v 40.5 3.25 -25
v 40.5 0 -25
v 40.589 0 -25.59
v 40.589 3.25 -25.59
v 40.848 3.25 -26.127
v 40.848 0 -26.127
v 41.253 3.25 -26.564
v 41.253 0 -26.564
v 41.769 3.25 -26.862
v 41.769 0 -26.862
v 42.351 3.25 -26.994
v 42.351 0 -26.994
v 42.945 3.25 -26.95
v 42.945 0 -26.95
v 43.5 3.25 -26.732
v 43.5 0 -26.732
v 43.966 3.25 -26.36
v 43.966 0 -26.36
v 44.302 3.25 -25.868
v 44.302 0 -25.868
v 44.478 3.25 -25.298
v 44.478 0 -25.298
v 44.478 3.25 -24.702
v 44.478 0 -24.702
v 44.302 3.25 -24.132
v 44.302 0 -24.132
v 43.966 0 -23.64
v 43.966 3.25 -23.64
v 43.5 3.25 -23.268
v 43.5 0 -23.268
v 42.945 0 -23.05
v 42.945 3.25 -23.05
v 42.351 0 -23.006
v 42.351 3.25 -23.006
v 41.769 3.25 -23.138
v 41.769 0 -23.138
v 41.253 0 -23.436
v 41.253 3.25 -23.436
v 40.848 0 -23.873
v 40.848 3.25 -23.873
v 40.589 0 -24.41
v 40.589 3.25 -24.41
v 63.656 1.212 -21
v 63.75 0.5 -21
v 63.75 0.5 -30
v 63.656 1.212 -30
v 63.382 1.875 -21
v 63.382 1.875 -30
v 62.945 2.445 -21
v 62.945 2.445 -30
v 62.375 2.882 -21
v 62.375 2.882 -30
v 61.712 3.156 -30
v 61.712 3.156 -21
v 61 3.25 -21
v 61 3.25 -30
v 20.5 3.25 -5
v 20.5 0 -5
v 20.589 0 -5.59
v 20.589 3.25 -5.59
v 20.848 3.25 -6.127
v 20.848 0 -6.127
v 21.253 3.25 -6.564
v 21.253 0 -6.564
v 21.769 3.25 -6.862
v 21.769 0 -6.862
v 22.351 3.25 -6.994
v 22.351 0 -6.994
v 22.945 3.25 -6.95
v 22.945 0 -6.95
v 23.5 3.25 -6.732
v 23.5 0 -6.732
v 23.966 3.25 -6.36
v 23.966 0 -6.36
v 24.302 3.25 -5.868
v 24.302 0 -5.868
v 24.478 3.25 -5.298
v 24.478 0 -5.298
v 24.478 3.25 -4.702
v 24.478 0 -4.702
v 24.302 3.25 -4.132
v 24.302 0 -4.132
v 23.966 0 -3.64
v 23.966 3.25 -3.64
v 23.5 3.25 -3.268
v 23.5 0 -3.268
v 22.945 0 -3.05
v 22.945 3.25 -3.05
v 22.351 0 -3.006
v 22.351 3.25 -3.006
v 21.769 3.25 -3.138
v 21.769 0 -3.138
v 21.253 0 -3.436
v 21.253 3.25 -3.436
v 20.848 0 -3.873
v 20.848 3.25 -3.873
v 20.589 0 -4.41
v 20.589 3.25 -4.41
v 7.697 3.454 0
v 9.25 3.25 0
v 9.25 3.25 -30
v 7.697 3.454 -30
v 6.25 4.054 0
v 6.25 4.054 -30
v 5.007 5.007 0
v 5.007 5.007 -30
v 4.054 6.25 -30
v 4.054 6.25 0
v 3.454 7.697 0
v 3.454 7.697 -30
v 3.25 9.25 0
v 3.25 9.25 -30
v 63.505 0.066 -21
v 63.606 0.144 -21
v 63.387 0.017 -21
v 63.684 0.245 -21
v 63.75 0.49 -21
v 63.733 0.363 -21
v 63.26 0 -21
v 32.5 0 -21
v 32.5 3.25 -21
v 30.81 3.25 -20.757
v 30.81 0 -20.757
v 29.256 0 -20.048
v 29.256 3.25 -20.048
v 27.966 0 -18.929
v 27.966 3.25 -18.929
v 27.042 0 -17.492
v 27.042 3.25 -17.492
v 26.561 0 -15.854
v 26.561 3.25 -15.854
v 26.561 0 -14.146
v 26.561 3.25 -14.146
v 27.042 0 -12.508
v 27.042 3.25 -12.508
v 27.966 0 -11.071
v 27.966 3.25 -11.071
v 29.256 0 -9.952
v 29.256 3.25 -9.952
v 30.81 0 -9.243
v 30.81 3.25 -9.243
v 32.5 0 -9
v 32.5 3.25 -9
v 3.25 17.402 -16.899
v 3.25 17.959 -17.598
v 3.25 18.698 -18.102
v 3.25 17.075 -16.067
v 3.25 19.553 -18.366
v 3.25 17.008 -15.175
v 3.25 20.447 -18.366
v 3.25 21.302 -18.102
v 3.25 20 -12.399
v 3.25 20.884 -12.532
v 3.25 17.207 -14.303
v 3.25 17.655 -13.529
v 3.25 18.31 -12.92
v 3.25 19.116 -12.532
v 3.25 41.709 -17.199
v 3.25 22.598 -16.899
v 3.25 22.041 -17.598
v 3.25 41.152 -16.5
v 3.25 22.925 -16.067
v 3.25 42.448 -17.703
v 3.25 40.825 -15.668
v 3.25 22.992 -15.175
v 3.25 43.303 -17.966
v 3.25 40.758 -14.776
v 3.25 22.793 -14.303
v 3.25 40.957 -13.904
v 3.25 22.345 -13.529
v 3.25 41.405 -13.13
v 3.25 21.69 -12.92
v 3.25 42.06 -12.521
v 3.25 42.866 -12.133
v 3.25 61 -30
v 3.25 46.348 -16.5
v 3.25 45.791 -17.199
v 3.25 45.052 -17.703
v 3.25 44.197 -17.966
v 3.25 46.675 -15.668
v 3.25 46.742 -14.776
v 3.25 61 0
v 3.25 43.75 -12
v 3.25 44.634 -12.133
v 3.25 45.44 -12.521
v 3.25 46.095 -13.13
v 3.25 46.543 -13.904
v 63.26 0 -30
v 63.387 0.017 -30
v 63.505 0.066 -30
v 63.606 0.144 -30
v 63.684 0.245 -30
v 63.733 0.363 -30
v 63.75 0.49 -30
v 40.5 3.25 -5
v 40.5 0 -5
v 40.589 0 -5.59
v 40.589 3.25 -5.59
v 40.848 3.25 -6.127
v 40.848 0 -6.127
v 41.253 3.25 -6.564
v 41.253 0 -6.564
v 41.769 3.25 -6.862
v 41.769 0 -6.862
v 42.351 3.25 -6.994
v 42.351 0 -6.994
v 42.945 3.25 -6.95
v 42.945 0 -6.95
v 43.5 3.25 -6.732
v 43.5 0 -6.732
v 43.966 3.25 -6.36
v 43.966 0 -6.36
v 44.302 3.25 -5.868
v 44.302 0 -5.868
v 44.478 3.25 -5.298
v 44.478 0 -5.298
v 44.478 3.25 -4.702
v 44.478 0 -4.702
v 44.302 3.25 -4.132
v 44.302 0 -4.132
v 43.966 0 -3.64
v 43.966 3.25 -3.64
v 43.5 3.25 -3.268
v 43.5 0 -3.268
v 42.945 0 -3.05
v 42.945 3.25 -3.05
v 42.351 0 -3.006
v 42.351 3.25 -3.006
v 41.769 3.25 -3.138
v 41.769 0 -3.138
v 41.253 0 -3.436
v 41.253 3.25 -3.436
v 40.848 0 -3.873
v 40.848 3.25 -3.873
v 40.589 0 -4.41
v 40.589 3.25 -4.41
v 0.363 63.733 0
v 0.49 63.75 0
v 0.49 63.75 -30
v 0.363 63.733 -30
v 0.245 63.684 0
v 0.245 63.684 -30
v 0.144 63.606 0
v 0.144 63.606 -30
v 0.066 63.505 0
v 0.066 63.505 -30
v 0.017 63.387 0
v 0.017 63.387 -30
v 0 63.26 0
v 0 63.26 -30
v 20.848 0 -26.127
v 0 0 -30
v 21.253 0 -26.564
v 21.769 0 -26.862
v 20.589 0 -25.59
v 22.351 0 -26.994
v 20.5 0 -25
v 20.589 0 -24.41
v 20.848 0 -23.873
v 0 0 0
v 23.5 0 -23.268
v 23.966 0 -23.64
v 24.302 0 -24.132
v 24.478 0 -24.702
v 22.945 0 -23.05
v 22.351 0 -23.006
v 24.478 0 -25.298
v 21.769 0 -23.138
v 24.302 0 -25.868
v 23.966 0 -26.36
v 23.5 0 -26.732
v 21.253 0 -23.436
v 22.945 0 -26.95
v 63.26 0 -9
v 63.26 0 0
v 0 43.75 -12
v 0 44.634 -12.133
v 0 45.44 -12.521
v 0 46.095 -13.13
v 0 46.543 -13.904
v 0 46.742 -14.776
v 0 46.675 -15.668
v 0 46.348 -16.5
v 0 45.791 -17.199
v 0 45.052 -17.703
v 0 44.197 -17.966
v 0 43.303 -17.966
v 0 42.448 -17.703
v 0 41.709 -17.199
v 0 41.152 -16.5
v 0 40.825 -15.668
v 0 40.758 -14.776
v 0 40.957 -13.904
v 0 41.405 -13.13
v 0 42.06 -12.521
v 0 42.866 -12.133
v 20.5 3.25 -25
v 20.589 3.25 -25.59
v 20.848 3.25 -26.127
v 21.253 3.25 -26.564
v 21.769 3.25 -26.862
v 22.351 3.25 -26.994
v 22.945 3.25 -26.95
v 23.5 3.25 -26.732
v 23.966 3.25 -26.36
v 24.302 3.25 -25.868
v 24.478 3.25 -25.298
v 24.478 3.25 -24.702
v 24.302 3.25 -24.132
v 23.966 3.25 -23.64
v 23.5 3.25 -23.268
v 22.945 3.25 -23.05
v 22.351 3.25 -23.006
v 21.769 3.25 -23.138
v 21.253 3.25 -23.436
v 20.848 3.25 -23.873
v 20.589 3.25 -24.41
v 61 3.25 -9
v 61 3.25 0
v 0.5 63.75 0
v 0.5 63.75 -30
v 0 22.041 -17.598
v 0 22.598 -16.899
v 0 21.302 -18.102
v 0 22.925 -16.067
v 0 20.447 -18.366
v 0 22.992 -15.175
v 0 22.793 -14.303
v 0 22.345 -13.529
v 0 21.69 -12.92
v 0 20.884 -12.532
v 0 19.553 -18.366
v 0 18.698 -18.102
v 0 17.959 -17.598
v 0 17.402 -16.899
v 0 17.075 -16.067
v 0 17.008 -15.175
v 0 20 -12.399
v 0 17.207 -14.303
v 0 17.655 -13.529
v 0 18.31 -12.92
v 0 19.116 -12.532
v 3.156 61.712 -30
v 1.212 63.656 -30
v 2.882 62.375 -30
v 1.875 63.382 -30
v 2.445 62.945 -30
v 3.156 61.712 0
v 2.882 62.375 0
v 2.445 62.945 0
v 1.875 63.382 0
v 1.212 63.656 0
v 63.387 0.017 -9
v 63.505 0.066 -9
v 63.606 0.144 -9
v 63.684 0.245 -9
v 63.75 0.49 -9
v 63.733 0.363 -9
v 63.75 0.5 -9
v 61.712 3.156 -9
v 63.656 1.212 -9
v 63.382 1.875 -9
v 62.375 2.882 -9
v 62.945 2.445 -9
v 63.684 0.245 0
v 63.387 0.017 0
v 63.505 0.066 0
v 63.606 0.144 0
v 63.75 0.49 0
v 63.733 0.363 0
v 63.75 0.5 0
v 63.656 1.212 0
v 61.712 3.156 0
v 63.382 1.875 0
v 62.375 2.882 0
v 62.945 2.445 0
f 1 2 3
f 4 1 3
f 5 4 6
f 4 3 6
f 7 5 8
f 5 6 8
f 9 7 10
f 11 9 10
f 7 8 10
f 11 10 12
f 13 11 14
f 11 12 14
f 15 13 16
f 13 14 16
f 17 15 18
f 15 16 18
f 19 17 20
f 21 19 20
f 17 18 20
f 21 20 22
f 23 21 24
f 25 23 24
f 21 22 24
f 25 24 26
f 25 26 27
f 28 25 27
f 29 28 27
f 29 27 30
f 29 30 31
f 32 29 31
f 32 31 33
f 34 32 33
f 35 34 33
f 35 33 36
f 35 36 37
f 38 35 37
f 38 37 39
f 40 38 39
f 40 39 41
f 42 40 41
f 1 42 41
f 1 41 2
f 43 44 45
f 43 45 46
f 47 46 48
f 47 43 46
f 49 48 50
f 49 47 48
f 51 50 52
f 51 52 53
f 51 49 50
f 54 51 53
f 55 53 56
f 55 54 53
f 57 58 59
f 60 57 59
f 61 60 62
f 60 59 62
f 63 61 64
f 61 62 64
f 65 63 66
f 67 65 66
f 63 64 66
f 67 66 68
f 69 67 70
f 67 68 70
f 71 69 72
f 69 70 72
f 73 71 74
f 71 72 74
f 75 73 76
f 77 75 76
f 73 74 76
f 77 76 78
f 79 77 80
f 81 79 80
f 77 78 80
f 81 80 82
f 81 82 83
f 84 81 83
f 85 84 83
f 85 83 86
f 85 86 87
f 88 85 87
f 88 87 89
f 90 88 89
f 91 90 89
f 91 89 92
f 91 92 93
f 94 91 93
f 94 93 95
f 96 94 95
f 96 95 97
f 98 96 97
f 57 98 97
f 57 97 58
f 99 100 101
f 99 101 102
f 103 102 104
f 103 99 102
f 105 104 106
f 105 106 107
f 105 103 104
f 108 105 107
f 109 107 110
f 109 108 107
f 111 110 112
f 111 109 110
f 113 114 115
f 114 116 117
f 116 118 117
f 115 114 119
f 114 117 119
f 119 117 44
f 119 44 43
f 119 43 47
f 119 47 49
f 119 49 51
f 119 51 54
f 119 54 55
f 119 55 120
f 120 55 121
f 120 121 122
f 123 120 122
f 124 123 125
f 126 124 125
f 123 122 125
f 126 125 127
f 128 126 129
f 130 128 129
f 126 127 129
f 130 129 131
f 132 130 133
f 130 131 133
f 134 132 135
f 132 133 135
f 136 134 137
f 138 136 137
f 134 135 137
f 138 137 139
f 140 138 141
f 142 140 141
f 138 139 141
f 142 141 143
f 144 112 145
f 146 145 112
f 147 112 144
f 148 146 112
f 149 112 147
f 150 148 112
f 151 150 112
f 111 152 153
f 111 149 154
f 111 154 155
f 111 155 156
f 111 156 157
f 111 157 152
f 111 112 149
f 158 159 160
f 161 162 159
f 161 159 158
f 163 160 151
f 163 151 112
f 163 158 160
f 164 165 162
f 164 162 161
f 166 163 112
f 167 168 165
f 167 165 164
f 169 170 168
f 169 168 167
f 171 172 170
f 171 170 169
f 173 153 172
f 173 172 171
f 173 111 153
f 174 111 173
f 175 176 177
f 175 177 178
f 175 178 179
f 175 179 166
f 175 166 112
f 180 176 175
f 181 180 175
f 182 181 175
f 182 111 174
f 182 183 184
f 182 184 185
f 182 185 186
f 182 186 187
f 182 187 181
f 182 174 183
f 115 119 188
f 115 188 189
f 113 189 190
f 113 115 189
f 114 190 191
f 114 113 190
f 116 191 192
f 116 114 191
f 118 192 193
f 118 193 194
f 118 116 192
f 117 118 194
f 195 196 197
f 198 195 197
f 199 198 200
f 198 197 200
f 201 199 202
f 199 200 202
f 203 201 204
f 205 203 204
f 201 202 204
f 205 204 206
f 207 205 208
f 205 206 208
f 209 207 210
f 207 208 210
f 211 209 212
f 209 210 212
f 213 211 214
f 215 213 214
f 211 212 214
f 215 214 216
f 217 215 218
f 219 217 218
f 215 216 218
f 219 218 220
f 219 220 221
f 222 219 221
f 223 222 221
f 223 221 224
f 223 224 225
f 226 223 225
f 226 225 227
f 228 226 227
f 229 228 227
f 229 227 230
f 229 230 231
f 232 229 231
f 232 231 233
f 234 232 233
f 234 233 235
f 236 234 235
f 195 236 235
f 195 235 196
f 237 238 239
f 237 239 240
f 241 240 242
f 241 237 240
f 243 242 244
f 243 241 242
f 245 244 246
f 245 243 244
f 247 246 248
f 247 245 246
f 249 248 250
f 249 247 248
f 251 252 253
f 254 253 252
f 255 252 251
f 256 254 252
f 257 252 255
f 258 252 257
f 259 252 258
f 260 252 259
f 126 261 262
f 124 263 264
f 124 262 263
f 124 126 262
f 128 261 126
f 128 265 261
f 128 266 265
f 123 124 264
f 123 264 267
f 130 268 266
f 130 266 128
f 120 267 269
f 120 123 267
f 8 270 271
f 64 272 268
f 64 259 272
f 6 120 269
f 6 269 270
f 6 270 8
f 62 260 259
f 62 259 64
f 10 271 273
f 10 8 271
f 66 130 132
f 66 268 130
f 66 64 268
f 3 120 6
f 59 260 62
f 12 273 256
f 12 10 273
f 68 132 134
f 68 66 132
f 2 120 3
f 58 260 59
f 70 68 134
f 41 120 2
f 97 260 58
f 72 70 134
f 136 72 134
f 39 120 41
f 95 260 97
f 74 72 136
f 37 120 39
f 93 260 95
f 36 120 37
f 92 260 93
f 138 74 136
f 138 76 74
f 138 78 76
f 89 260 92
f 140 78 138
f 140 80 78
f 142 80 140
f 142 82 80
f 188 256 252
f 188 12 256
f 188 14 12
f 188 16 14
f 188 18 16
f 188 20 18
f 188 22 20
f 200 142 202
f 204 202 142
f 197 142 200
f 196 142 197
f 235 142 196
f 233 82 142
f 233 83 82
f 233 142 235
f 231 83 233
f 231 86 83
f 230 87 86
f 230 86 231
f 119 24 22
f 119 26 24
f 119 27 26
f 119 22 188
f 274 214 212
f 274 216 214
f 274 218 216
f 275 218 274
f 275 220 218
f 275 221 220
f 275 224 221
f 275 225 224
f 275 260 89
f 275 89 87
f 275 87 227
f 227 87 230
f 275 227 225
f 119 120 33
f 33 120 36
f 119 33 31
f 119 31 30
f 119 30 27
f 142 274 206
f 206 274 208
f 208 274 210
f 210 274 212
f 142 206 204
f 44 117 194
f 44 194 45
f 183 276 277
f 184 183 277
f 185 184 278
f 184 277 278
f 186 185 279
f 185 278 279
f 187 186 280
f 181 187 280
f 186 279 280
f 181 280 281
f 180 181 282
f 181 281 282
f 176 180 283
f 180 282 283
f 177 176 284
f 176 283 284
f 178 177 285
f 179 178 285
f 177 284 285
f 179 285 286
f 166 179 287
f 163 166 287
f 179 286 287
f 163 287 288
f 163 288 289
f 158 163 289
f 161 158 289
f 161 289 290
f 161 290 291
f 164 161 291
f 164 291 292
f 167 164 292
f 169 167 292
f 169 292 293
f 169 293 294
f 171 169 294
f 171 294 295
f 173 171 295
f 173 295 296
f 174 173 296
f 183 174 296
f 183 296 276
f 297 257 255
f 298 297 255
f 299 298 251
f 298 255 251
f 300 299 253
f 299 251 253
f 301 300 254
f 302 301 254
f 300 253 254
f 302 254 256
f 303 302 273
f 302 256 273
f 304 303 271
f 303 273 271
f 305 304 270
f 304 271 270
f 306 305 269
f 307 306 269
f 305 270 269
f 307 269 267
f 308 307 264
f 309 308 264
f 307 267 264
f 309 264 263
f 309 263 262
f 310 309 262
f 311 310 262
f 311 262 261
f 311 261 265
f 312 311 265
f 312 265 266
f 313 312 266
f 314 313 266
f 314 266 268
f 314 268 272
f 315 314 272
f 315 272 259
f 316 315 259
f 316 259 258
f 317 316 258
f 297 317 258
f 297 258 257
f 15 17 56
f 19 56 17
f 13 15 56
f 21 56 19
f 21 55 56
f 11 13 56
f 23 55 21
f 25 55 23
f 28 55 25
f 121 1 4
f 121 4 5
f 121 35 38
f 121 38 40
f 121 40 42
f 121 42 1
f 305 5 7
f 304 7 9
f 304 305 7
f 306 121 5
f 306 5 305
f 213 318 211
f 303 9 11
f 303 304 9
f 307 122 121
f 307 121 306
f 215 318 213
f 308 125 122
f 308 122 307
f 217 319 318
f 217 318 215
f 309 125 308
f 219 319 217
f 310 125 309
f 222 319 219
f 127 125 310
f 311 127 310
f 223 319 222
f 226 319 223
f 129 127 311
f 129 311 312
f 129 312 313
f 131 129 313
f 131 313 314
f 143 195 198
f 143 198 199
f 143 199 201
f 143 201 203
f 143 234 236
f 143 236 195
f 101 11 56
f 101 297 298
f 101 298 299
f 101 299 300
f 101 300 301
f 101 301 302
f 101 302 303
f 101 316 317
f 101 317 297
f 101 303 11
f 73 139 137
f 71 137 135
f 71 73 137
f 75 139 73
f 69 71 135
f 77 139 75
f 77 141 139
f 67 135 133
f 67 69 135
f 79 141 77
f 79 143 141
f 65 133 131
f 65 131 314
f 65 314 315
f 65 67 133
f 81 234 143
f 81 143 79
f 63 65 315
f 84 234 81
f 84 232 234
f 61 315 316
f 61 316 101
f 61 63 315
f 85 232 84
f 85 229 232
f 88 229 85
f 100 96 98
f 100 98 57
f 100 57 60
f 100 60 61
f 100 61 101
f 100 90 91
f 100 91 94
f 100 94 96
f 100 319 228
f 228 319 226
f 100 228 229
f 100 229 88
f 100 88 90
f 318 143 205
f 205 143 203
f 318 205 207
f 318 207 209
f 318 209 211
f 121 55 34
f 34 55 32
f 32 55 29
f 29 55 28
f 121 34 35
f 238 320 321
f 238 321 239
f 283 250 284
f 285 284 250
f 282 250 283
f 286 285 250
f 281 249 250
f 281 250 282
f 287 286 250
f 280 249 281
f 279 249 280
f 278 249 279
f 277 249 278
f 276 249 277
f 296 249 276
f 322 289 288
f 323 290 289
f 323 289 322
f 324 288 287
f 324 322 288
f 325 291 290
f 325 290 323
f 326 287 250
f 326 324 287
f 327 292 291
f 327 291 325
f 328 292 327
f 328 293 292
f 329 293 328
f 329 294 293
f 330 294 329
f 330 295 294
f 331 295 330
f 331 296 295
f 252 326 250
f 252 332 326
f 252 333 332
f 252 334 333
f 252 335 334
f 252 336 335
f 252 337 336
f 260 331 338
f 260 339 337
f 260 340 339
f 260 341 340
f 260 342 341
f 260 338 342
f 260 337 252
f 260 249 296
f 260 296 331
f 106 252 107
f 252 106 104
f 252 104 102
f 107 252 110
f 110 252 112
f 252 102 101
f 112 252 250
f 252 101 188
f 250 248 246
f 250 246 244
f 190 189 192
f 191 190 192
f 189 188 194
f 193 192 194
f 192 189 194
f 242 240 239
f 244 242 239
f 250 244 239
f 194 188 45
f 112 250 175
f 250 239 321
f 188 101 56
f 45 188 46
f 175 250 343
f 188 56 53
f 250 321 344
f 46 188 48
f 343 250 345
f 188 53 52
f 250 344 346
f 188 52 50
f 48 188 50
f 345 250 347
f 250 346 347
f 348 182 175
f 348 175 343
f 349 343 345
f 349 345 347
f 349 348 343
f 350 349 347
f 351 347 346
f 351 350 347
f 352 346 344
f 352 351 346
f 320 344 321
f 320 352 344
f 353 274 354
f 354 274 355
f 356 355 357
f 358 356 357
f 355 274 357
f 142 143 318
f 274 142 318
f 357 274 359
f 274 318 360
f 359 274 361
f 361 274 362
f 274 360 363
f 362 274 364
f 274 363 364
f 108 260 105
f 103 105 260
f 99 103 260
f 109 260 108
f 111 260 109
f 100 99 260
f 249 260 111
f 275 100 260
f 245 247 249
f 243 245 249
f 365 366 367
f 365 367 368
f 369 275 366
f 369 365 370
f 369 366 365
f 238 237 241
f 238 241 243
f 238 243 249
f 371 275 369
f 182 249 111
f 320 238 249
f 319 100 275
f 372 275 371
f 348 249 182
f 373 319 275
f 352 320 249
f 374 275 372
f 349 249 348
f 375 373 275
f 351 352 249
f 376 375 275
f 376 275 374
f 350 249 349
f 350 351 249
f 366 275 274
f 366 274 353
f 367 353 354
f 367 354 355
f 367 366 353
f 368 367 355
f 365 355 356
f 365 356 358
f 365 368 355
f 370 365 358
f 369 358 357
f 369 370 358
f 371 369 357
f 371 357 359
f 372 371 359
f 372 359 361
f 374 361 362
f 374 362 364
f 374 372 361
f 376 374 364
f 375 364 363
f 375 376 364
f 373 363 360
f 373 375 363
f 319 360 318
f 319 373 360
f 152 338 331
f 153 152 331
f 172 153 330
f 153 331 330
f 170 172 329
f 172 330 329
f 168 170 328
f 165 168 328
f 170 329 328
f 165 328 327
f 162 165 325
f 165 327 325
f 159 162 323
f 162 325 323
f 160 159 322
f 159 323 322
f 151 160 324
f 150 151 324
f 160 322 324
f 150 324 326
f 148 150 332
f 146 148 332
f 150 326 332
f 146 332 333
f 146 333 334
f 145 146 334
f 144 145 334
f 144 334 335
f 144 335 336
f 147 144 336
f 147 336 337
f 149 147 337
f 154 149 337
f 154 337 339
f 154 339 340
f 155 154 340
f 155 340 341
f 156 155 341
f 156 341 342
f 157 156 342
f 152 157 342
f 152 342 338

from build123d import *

# Parameters (mm, degrees)
BOSS_EXTRUDE1_DEPTH          = 30
F_4_0_4_DIAMETER_HOLE1_D     = 4
F_4_0_4_DIAMETER_HOLE1_DEPTH = 10
F_4_0_4_DIAMETER_HOLE1_TIP   = 1.201721238
CUT_EXTRUDE1_DEPTH           = 93.867176656
F_6_0_6_DIAMETER_HOLE1_D     = 6
F_6_0_6_DIAMETER_HOLE1_DEPTH = 10
F_6_0_6_DIAMETER_HOLE1_TIP   = 1.802581857


with BuildPart() as part:
    # Sketch2 → Boss-Extrude1 (new body)
    with BuildSketch(Plane.XY):
        with BuildLine():
            Line((0, 0), (63.26, 0))
            ThreePointArc((63.26, 0), (63.606482323, 0.143517677), (63.75, 0.49))
            Line((63.75, 0.49), (63.75, 0.5))
            ThreePointArc((63.75, 0.5), (62.944543648, 2.444543648), (61, 3.25))
            Line((61, 3.25), (9.25, 3.25))
            ThreePointArc((9.25, 3.25), (5.007359313, 5.007359313), (3.25, 9.25))
            Line((3.25, 9.25), (3.25, 61))
            ThreePointArc((3.25, 61), (2.444543648, 62.944543648), (0.5, 63.75))
            Line((0.5, 63.75), (0.49, 63.75))
            ThreePointArc((0.49, 63.75), (0.143517677, 63.606482323), (0, 63.26))
            Line((0, 63.26), (0, 0))
        make_face()
    extrude(amount=-BOSS_EXTRUDE1_DEPTH)

    # Ø4.0 (4) Diameter Hole1
    with Locations(Plane(origin=(0, 3.25, 0), x_dir=(1, 0, 0), z_dir=(0, 1, 0))):
        with Locations((22.5, 5), (22.5, 25), (42.5, 25), (42.5, 5)):
            Hole(F_4_0_4_DIAMETER_HOLE1_D / 2, depth=F_4_0_4_DIAMETER_HOLE1_DEPTH)
            with Locations((0, 0, -(F_4_0_4_DIAMETER_HOLE1_DEPTH + F_4_0_4_DIAMETER_HOLE1_TIP / 2))):  # 118° drill point
                Cone(0, F_4_0_4_DIAMETER_HOLE1_D / 2, F_4_0_4_DIAMETER_HOLE1_TIP, mode=Mode.SUBTRACT)

    # Sketch6 → Cut-Extrude1 (cut, through all)
    with BuildSketch(Plane(origin=(0, 3.25, 0), x_dir=(1, 0, 0), z_dir=(0, 1, 0))):
        with BuildLine():
            Line((32.5, 9), (66.86726804, 9))
            Line((66.86726804, 9), (66.86726804, 21))
            Line((66.86726804, 21), (32.5, 21))
            ThreePointArc((32.5, 21), (26.5, 15), (32.5, 9))
        make_face()
    extrude(amount=-CUT_EXTRUDE1_DEPTH, mode=Mode.SUBTRACT)

    # Ø6.0 (6) Diameter Hole1
    with Locations(Plane(origin=(3.25, 0, 0), x_dir=(0, 0, -1), z_dir=(1, 0, 0))):
        with Locations((15, 43.75), (15.399206183, 20)):
            Hole(F_6_0_6_DIAMETER_HOLE1_D / 2, depth=F_6_0_6_DIAMETER_HOLE1_DEPTH)
            with Locations((0, 0, -(F_6_0_6_DIAMETER_HOLE1_DEPTH + F_6_0_6_DIAMETER_HOLE1_TIP / 2))):  # 118° drill point
                Cone(0, F_6_0_6_DIAMETER_HOLE1_D / 2, F_6_0_6_DIAMETER_HOLE1_TIP, mode=Mode.SUBTRACT)


solid = part.part
